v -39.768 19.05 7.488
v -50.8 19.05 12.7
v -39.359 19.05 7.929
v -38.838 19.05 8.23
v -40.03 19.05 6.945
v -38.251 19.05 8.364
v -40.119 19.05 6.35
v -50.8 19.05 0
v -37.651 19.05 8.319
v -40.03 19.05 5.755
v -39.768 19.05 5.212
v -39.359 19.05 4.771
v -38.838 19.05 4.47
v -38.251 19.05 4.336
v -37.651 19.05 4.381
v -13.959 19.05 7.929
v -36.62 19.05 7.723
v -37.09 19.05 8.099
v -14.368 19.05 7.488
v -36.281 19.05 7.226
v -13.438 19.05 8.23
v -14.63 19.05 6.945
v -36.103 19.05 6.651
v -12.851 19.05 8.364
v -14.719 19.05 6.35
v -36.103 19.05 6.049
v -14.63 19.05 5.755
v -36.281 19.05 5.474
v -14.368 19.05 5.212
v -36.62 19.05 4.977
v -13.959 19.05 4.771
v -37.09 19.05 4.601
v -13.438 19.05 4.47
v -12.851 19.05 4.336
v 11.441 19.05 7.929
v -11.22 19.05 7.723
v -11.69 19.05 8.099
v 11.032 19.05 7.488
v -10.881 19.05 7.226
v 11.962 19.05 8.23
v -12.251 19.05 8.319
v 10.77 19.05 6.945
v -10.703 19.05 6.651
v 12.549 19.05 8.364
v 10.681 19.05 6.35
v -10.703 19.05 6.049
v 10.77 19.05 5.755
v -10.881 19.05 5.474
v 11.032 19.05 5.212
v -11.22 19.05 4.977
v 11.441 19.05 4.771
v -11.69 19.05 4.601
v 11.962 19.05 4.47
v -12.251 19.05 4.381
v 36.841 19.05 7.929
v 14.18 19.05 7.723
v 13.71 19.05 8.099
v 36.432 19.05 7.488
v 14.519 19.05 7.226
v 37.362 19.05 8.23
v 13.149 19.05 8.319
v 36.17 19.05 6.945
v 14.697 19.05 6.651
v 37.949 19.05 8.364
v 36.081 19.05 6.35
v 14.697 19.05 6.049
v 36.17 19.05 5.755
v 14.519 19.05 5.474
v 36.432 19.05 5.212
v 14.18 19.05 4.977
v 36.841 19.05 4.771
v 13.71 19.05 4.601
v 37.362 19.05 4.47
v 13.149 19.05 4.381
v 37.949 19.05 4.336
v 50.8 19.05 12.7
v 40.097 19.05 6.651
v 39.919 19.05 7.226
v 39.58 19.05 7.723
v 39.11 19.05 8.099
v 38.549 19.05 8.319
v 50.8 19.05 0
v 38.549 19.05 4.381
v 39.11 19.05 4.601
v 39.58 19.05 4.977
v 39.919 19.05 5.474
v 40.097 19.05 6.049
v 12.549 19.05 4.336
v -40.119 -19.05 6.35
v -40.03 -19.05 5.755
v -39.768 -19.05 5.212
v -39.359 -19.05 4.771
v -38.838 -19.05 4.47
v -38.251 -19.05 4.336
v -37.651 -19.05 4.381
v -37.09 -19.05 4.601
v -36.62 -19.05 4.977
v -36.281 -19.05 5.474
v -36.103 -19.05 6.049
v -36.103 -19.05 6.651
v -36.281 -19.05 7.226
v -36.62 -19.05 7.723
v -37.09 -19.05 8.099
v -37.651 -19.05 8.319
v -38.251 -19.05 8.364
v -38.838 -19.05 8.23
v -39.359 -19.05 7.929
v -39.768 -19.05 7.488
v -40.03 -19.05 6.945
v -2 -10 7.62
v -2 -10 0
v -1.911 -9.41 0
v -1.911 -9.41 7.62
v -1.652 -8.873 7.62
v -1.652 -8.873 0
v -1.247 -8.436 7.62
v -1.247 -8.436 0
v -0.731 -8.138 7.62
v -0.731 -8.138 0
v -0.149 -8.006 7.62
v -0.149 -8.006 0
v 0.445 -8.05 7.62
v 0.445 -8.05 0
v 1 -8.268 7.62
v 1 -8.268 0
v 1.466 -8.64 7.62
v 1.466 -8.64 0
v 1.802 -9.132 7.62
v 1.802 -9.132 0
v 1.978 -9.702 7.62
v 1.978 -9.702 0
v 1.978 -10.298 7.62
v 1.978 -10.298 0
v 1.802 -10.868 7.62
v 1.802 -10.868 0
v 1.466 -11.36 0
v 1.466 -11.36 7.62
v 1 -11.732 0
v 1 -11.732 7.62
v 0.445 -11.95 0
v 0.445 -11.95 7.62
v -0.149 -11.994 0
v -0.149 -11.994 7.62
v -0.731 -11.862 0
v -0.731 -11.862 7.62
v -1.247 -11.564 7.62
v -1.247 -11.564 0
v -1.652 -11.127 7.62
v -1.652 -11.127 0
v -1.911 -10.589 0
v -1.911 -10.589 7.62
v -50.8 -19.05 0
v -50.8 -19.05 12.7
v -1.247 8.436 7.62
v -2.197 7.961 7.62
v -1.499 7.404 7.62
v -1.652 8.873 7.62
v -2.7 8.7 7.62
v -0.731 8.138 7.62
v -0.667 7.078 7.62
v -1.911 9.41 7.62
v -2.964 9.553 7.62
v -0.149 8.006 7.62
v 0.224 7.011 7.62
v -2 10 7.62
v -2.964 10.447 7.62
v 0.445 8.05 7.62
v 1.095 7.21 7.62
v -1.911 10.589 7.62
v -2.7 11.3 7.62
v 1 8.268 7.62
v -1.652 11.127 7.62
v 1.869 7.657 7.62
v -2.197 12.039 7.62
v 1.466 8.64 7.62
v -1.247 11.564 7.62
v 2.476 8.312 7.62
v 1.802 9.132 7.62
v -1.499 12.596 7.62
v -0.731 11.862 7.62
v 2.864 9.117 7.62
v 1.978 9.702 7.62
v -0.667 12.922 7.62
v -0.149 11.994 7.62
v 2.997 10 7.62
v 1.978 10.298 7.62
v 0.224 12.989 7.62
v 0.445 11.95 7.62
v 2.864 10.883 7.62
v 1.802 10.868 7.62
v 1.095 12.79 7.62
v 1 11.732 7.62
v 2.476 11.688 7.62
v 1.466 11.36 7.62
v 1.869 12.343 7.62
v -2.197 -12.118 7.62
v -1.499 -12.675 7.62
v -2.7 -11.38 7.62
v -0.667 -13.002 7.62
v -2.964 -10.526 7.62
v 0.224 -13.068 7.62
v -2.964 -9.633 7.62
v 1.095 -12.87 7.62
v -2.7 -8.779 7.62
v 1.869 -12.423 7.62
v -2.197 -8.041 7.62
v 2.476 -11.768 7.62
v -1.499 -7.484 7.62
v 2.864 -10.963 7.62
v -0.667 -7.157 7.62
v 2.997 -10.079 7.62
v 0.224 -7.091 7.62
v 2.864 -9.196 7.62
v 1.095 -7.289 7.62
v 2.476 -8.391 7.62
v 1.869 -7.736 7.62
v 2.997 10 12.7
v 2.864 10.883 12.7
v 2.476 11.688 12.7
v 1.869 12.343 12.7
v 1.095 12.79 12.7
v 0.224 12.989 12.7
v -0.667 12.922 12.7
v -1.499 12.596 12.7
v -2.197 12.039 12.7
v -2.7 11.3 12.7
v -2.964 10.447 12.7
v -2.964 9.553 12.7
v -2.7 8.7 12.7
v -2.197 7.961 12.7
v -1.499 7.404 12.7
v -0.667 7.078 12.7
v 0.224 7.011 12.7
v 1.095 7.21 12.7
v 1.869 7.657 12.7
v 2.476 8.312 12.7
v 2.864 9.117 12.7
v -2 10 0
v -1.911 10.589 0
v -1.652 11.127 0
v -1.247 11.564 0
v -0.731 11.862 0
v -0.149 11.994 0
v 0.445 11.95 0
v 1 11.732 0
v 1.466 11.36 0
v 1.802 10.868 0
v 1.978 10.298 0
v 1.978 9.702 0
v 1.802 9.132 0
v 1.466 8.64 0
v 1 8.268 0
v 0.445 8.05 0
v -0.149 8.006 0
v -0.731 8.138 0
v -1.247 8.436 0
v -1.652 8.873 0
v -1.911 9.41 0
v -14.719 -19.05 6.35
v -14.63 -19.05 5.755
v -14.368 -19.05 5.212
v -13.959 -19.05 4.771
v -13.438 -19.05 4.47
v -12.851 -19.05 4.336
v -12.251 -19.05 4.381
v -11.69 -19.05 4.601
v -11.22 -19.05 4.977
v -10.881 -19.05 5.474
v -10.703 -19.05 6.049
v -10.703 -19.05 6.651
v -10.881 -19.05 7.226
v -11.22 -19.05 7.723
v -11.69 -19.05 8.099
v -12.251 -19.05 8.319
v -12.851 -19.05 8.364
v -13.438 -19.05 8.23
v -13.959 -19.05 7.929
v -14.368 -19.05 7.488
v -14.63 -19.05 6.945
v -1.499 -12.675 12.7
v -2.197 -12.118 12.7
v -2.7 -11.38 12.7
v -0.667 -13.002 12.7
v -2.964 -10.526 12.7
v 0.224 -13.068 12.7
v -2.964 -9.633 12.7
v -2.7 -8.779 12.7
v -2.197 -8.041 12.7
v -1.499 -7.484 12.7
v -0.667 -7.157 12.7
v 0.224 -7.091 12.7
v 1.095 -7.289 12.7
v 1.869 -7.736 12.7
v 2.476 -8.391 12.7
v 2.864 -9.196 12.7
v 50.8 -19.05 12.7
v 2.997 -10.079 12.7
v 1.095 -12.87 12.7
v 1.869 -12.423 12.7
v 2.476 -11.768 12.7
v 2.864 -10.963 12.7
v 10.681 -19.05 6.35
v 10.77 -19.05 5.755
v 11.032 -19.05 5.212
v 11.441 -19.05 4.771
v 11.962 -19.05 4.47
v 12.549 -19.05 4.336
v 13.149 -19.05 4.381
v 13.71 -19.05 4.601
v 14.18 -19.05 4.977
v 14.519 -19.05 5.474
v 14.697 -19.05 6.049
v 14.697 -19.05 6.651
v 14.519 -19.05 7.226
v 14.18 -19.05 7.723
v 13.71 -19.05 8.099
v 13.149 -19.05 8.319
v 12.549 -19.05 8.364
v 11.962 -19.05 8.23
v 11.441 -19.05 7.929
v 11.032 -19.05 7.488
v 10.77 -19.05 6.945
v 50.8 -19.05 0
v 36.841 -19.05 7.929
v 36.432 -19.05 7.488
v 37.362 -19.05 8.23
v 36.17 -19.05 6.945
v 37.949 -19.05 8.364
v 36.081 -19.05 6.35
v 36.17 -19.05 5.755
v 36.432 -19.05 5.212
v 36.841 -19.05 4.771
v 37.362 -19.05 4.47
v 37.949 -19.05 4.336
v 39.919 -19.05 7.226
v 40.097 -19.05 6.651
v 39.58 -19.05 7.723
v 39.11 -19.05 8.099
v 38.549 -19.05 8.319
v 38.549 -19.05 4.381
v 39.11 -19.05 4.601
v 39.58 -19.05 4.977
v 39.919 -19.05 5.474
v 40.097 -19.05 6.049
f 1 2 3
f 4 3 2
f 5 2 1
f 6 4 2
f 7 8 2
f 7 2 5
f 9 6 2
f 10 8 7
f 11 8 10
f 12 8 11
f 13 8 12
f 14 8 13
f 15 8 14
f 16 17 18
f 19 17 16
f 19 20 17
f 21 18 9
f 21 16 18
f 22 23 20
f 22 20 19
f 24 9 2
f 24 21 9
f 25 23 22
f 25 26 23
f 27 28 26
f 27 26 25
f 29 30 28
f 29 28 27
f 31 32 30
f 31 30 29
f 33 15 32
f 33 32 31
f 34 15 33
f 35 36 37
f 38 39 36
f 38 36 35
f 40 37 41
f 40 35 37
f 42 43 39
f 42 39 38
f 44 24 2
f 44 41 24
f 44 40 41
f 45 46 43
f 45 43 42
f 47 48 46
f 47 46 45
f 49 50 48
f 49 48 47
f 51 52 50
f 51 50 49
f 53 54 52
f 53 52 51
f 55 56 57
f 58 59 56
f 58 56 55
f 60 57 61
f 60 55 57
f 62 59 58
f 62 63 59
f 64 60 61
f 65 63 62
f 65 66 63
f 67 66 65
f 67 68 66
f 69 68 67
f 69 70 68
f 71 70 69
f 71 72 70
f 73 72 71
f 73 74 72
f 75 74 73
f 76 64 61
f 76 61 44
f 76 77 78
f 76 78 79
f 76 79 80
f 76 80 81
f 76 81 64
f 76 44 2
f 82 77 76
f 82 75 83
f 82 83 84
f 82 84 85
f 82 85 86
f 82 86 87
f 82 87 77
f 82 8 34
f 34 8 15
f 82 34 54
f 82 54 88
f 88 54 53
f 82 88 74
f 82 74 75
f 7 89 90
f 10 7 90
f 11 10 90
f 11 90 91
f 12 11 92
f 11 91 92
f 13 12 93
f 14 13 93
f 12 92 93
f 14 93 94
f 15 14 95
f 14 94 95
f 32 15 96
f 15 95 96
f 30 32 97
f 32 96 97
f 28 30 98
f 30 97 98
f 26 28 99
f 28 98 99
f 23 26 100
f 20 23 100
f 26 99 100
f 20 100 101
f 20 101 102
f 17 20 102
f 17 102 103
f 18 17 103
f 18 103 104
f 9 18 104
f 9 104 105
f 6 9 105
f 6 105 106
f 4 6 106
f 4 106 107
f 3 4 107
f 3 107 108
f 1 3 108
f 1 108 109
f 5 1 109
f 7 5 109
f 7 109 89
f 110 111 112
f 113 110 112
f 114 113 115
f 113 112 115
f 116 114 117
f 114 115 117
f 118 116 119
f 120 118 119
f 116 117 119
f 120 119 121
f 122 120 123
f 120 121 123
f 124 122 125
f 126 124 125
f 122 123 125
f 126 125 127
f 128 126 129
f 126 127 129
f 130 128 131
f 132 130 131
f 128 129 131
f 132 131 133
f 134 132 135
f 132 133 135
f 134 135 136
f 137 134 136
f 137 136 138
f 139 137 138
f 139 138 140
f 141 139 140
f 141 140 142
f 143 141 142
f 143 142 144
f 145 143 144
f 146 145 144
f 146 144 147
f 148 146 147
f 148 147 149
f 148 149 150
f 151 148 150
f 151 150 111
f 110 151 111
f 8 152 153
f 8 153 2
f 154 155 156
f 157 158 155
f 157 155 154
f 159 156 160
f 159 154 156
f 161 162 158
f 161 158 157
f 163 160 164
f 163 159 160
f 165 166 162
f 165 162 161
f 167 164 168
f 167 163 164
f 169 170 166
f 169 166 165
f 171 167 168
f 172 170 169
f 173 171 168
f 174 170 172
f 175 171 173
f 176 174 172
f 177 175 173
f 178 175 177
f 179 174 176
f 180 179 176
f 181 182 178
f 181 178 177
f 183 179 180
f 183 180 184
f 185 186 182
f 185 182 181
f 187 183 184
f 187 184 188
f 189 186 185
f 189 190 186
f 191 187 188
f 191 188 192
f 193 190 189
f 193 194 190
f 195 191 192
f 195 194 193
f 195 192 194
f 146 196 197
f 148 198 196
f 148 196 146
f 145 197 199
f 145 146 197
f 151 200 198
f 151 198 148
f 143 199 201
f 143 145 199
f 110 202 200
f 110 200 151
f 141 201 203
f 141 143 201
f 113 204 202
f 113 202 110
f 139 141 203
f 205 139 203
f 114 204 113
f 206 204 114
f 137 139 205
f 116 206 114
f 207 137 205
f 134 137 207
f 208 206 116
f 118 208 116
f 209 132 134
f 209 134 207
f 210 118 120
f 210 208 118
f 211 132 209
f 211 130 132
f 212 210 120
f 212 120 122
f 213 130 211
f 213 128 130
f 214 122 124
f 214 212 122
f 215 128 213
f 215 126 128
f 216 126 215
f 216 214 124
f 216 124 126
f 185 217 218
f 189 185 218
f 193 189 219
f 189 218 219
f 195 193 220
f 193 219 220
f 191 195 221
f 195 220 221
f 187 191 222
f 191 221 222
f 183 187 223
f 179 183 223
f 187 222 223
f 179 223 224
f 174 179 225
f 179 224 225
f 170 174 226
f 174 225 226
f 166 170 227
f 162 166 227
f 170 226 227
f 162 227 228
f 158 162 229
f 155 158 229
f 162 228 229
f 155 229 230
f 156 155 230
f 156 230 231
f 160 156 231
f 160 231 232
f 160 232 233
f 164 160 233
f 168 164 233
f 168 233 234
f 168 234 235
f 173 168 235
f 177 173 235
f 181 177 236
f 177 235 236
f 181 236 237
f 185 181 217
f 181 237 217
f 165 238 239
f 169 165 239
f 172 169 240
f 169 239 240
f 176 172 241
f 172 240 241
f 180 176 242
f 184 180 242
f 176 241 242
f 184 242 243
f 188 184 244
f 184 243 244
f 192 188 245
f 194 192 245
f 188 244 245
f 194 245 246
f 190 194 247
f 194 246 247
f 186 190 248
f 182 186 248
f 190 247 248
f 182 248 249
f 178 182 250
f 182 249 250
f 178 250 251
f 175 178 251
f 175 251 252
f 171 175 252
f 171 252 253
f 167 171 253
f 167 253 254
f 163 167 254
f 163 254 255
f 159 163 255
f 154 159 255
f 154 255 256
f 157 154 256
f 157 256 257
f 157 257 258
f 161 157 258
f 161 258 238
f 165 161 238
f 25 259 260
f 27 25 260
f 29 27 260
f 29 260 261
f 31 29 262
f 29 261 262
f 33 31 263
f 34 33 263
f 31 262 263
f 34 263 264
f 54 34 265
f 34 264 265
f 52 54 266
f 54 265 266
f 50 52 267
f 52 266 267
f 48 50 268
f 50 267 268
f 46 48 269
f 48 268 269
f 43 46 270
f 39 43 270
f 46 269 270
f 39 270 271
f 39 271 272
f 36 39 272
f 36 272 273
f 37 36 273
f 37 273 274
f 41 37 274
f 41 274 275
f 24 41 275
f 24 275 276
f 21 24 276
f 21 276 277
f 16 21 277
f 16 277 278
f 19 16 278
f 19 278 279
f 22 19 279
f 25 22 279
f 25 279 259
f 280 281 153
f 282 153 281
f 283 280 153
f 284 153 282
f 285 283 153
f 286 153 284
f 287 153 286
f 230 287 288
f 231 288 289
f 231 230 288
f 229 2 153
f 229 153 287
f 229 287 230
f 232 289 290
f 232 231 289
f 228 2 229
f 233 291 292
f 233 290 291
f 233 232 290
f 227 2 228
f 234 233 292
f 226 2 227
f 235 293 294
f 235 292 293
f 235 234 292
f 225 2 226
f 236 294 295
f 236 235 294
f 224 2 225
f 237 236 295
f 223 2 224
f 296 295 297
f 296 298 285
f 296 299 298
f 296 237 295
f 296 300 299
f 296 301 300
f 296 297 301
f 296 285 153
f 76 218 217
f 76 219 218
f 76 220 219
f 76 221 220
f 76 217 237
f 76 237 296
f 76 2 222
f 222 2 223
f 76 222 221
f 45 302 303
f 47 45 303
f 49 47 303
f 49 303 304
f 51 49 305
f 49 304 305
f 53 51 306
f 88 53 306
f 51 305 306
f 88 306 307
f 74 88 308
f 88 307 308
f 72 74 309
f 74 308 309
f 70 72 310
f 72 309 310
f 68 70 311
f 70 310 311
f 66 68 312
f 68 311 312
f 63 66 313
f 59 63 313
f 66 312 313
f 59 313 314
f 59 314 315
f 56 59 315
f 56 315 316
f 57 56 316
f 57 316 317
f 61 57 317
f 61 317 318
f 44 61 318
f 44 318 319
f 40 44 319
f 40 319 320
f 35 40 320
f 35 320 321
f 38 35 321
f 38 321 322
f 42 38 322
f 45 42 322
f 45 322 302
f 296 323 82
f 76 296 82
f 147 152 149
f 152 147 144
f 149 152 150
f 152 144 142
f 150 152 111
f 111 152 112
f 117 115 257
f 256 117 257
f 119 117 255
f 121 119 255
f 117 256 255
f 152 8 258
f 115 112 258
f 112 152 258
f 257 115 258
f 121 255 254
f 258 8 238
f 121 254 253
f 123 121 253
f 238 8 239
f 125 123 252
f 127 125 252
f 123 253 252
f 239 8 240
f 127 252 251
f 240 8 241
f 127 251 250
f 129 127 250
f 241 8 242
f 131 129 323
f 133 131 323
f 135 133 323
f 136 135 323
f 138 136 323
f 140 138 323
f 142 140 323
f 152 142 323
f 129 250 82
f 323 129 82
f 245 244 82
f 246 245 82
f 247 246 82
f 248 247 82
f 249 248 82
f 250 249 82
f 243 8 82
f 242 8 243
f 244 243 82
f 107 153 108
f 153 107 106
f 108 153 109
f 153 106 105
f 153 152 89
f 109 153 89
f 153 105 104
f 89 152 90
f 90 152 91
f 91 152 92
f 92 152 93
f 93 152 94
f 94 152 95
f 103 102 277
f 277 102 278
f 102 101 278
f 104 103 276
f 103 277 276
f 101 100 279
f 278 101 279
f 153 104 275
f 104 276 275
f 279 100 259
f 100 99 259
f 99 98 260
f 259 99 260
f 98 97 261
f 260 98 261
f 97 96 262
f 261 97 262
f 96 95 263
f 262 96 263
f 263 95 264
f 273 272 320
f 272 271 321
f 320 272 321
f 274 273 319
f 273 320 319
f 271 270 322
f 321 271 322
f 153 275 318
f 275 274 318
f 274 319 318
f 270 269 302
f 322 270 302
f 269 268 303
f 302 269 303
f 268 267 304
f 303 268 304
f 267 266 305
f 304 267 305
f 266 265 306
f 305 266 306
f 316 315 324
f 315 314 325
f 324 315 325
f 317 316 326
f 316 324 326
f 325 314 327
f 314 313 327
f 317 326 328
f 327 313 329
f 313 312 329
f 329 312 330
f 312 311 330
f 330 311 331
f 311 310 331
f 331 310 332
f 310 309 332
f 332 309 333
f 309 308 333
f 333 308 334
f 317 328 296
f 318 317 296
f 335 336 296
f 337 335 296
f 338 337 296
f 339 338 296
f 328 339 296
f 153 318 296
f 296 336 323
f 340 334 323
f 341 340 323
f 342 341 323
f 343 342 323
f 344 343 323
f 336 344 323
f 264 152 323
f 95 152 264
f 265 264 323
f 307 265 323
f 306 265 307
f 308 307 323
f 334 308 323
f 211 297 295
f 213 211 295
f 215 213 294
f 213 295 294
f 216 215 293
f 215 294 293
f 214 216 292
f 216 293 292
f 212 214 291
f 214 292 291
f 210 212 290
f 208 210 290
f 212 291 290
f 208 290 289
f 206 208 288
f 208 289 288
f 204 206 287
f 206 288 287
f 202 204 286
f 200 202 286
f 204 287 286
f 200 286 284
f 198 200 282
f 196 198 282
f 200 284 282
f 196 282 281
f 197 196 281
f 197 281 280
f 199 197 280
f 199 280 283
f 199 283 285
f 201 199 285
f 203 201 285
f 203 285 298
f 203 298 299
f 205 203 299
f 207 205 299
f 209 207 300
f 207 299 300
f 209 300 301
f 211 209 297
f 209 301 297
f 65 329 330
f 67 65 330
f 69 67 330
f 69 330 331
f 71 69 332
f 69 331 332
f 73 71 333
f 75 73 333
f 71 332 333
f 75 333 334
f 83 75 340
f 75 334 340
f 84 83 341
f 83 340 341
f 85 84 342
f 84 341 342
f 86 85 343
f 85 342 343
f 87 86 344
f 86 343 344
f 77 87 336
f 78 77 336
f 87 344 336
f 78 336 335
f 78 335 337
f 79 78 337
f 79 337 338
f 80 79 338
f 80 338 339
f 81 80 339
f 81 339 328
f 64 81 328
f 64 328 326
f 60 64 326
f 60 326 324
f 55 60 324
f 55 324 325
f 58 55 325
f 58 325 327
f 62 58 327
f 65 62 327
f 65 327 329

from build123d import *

# Parameters (mm, degrees)
SKETCH1_W              = 101.6
SKETCH1_H              = 38.1
BOSS_EXTRUDE1_DEPTH    = 12.7
F_4_0MM_DOWEL_HOLE1_D  = 4
SKETCH7_R              = 2.9972
CUT_EXTRUDE1_DEPTH     = 5.08
F_10_32_TAPPED_HOLE1_D = 4.0386


with BuildPart() as part:
    # Sketch1 → Boss-Extrude1 (new body)
    with BuildSketch(Plane.XY):
        Rectangle(SKETCH1_W, SKETCH1_H)
    extrude(amount=BOSS_EXTRUDE1_DEPTH)

    # Ø4.0mm Dowel Hole1 (through all)
    with Locations(Plane.XY.offset(12.7)):
        with Locations((0, 9.99998), (0, -9.99998)):
            Hole(F_4_0MM_DOWEL_HOLE1_D / 2)

    # Sketch7 → Cut-Extrude1 (cut)
    with BuildSketch(Plane.XY.offset(12.7)):
        with Locations((0, -10.079486129)):
            Circle(SKETCH7_R)
        with Locations((0, 9.99998)):
            Circle(SKETCH7_R)
    extrude(amount=-CUT_EXTRUDE1_DEPTH, mode=Mode.SUBTRACT)

    # #10-32 Tapped Hole1 (through all)
    with Locations(Plane(origin=(0, 19.05, 0), x_dir=(1, 0, 0), z_dir=(0, 1, 0))):
        with Locations((38.1, -6.35), (12.7, -6.35), (-12.7, -6.35), (-38.1, -6.35)):
            Hole(F_10_32_TAPPED_HOLE1_D / 2)


solid = part.part
